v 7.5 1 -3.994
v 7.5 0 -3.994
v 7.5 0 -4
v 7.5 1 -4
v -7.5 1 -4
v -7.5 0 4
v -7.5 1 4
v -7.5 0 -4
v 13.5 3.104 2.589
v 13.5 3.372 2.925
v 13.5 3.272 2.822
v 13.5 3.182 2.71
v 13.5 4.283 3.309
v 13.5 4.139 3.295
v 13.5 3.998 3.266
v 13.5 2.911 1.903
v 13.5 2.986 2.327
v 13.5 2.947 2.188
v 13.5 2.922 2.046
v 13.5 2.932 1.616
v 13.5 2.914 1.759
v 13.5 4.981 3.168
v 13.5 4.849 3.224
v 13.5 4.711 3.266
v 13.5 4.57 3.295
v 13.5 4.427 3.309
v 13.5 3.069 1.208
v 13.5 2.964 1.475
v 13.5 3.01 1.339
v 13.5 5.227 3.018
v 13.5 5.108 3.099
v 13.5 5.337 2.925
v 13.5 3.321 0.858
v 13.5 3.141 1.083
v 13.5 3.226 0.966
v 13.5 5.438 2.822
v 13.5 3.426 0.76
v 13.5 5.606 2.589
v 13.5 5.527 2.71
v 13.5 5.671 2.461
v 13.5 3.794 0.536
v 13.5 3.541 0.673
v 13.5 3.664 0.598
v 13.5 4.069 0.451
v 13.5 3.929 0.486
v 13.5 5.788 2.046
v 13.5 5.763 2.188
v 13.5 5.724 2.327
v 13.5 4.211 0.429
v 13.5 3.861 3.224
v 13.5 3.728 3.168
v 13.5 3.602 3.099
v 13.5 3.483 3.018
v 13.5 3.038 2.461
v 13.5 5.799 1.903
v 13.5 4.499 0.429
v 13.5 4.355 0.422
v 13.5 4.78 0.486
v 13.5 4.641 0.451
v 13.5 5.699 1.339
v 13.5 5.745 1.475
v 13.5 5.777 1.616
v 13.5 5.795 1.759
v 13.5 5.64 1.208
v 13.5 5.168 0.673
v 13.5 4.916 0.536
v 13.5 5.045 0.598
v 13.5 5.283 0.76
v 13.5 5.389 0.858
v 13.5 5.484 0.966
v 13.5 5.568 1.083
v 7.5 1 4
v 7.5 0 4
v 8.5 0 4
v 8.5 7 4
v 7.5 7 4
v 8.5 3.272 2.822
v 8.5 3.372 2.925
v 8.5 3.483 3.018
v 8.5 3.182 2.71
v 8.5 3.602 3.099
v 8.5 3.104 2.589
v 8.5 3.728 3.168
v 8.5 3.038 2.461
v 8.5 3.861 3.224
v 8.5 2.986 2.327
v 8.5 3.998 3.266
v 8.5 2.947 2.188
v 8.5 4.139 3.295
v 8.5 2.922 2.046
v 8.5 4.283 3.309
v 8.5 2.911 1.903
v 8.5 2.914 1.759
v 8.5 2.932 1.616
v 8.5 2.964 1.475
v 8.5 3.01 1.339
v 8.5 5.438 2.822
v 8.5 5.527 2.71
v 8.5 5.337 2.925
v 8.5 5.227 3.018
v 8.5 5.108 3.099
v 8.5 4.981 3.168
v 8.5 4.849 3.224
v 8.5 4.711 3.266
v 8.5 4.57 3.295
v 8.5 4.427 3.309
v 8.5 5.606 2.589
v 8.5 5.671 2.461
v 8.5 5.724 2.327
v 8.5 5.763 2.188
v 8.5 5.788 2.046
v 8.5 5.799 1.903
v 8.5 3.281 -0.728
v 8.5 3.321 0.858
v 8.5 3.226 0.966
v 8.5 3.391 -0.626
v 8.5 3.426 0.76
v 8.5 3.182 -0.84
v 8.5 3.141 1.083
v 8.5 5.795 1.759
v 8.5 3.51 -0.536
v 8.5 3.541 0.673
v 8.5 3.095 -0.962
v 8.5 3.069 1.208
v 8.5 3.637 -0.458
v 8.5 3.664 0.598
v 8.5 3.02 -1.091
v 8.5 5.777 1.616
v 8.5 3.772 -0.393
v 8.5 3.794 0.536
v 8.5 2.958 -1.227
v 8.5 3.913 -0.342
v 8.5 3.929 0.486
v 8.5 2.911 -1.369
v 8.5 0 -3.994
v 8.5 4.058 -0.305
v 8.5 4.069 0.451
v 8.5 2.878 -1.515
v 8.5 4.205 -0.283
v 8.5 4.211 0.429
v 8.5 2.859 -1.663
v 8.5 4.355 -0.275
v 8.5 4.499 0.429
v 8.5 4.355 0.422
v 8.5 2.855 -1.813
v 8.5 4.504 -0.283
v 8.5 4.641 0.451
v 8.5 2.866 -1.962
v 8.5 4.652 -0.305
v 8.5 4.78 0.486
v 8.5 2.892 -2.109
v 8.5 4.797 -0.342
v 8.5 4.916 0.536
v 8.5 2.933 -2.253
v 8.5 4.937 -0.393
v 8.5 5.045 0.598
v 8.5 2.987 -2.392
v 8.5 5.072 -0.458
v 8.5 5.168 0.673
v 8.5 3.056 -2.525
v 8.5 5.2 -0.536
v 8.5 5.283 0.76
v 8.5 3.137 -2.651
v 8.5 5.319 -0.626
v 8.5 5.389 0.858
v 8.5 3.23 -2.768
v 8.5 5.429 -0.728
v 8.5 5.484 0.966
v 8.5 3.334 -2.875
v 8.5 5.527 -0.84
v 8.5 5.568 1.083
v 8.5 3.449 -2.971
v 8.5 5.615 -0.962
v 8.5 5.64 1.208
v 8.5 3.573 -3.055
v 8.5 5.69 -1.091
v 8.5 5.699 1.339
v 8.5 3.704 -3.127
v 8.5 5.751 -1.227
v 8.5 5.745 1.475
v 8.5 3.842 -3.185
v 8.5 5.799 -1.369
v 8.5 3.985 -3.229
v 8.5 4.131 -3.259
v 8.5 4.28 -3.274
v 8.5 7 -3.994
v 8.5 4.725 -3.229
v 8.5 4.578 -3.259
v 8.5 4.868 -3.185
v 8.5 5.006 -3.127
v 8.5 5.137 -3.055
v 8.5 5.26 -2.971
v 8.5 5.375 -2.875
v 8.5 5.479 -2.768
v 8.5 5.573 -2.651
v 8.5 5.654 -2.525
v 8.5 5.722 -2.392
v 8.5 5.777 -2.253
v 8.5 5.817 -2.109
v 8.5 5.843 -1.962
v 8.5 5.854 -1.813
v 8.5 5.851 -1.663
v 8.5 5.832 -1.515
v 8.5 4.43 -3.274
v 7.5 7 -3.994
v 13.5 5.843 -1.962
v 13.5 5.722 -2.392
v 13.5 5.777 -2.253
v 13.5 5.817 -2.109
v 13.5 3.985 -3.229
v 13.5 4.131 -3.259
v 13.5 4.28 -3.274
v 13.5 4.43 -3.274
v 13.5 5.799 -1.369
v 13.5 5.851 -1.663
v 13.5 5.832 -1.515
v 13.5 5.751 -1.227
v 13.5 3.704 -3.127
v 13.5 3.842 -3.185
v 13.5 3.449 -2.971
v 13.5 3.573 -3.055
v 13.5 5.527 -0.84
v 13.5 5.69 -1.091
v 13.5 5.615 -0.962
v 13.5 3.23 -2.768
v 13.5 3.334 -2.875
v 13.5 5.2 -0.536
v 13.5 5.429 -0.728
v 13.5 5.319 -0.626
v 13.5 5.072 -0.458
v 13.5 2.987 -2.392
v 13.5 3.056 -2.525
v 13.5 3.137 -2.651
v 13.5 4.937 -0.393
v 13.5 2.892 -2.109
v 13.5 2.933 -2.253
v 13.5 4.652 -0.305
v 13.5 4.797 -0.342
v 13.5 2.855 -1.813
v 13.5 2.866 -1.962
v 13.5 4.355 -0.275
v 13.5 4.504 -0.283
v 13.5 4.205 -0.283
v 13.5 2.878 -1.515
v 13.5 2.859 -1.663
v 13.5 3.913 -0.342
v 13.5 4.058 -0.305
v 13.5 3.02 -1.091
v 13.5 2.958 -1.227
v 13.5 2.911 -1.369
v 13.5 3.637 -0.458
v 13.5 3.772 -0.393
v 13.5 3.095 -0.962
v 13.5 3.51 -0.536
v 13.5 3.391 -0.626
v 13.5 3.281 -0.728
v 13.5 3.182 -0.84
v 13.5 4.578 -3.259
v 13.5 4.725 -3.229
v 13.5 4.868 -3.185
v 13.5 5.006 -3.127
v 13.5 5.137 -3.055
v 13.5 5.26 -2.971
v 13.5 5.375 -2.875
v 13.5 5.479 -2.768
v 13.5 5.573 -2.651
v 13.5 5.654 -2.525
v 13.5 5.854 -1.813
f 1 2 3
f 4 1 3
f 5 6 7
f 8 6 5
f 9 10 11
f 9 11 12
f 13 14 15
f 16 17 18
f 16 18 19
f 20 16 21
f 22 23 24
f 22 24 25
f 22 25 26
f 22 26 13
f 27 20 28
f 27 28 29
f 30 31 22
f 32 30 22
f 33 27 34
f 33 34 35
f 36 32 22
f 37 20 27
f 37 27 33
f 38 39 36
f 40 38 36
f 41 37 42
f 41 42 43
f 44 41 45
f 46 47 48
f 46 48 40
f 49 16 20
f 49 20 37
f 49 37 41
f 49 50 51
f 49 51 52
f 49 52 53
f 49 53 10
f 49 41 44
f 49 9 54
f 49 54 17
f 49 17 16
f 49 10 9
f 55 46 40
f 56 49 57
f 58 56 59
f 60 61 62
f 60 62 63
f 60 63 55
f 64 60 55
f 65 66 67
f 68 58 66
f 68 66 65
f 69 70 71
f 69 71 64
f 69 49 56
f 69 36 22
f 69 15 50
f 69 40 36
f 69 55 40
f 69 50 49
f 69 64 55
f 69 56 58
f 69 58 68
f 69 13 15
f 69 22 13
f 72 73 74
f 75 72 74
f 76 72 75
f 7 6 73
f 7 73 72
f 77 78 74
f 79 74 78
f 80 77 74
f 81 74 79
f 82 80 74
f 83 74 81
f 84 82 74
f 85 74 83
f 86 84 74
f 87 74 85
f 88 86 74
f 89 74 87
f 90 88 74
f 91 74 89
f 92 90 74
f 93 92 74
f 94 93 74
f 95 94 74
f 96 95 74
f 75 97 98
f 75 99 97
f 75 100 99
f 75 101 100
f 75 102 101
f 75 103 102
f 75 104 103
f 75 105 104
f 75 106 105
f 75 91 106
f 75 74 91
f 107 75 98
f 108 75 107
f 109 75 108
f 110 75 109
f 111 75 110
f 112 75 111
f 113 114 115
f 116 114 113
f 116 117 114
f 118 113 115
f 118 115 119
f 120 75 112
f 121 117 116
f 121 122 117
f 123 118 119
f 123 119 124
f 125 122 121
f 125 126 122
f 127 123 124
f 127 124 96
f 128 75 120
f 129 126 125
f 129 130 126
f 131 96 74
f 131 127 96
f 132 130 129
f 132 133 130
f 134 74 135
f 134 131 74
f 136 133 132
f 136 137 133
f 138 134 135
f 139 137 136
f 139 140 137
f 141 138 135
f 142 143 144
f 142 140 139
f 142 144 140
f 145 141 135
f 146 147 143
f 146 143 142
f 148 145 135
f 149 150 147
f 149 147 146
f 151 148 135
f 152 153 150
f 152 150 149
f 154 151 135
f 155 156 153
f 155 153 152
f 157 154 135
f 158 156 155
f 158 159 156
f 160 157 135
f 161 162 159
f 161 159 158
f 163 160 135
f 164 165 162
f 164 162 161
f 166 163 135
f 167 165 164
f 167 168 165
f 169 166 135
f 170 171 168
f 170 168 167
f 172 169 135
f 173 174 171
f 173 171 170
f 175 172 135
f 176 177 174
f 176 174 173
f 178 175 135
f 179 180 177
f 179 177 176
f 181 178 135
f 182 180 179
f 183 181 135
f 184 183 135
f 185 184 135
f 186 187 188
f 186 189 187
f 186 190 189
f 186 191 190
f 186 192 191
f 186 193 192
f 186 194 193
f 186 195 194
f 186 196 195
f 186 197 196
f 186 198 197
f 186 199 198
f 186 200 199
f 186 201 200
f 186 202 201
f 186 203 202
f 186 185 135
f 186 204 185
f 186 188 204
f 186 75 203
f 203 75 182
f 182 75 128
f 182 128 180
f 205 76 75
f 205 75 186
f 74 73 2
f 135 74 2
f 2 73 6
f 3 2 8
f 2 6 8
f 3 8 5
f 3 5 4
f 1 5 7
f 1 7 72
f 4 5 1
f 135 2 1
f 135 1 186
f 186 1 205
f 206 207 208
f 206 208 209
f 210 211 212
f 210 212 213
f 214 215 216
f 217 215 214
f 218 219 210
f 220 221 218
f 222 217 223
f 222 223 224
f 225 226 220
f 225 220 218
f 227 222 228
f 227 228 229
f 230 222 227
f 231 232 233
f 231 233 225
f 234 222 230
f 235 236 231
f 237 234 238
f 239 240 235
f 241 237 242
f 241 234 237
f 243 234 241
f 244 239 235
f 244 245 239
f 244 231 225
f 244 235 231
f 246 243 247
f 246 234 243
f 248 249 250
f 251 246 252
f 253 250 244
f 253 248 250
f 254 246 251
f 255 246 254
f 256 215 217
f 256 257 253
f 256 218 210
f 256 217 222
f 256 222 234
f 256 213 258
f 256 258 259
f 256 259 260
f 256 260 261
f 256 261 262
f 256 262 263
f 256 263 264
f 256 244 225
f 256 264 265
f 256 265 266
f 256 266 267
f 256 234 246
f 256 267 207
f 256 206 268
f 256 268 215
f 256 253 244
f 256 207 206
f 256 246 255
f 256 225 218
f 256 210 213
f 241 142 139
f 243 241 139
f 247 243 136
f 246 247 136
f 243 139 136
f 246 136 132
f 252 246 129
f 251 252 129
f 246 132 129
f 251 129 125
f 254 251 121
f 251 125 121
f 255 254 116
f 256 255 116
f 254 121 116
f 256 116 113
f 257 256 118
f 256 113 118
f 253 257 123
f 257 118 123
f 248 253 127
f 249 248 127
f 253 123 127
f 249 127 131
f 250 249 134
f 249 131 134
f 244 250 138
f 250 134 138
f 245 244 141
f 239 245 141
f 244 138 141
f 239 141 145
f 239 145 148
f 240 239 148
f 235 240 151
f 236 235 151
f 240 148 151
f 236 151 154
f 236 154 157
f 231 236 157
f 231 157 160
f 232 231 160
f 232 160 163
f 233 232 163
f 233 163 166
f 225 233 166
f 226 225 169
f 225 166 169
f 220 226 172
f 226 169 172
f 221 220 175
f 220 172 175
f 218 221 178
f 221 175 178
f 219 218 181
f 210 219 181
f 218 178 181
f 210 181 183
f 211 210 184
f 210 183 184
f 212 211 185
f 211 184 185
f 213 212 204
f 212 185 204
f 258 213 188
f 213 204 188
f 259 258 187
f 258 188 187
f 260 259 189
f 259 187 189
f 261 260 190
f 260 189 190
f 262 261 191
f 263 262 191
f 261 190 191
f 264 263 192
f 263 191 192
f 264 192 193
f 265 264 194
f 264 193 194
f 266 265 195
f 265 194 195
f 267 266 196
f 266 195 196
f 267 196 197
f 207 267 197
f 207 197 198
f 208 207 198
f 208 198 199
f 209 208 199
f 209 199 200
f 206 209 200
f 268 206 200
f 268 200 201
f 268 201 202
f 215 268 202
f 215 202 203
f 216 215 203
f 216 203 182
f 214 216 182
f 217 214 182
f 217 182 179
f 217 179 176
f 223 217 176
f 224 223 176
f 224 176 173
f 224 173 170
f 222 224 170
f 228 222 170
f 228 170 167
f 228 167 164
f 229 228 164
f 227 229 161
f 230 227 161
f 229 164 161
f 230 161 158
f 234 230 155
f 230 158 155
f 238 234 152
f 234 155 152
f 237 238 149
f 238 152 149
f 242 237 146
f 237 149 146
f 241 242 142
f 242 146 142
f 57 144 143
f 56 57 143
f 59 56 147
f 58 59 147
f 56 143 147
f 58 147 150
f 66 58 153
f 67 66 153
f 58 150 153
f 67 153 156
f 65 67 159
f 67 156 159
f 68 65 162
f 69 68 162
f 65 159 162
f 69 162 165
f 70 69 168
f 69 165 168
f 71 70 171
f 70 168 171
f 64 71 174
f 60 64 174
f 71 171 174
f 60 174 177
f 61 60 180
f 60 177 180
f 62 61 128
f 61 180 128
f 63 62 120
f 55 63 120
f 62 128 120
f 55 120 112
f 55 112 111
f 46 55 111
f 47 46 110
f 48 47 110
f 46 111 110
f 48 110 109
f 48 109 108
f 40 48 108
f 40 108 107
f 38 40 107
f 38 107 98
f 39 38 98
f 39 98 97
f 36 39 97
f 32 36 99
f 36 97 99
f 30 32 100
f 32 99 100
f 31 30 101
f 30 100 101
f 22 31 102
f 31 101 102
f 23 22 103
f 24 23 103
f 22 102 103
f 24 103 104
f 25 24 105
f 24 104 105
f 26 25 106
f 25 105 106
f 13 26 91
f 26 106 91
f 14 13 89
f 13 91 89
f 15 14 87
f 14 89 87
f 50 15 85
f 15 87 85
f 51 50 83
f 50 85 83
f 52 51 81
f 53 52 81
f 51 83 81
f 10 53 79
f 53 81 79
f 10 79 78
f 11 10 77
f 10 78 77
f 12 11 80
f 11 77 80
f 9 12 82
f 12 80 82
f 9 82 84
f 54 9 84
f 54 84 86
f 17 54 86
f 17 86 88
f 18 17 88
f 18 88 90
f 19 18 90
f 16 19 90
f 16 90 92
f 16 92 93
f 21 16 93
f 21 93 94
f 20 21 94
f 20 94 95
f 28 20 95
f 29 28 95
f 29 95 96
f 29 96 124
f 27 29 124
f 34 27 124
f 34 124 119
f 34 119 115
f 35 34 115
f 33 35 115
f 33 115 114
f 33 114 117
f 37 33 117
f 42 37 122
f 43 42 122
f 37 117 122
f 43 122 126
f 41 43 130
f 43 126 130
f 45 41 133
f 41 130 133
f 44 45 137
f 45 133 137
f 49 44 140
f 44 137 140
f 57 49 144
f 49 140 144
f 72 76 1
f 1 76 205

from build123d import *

# Parameters (mm, degrees)
SKETCH1_W           = 15
SKETCH1_H           = 8
BOSS_EXTRUDE1_DEPTH = 1
SKETCH2_W           = 7.993829057
SKETCH2_H           = 7
BOSS_EXTRUDE2_DEPTH = 1
SKETCH3_R           = 1.444324147
SKETCH3_R_2         = 1.5
BOSS_EXTRUDE3_DEPTH = 5


with BuildPart() as part:
    # Sketch1 → Boss-Extrude1 (new body)
    with BuildSketch(Plane(origin=(0, 0, 0), x_dir=(1, 0, 0), z_dir=(0, 1, 0))):
        Rectangle(SKETCH1_W, SKETCH1_H)
    extrude(amount=BOSS_EXTRUDE1_DEPTH)

    # Sketch2 → Boss-Extrude2 (add)
    with BuildSketch(Plane(origin=(7.5, 0, 0), x_dir=(0, 0, -1), z_dir=(1, 0, 0))):
        with Locations((-0.003085471, 3.5)):
            Rectangle(SKETCH2_W, SKETCH2_H)
    extrude(amount=BOSS_EXTRUDE2_DEPTH)

    # Sketch3 → Boss-Extrude3 (add)
    with BuildSketch(Plane(origin=(8.5, 0, 0), x_dir=(0, 0, -1), z_dir=(1, 0, 0))):
        with Locations((-1.866576137, 4.354733514)):
            Circle(SKETCH3_R)
        with Locations(Location((1.775399333, 4.354733514, 0), (0, 0, 180))):
            Circle(SKETCH3_R_2)
    extrude(amount=BOSS_EXTRUDE3_DEPTH)


solid = part.part
